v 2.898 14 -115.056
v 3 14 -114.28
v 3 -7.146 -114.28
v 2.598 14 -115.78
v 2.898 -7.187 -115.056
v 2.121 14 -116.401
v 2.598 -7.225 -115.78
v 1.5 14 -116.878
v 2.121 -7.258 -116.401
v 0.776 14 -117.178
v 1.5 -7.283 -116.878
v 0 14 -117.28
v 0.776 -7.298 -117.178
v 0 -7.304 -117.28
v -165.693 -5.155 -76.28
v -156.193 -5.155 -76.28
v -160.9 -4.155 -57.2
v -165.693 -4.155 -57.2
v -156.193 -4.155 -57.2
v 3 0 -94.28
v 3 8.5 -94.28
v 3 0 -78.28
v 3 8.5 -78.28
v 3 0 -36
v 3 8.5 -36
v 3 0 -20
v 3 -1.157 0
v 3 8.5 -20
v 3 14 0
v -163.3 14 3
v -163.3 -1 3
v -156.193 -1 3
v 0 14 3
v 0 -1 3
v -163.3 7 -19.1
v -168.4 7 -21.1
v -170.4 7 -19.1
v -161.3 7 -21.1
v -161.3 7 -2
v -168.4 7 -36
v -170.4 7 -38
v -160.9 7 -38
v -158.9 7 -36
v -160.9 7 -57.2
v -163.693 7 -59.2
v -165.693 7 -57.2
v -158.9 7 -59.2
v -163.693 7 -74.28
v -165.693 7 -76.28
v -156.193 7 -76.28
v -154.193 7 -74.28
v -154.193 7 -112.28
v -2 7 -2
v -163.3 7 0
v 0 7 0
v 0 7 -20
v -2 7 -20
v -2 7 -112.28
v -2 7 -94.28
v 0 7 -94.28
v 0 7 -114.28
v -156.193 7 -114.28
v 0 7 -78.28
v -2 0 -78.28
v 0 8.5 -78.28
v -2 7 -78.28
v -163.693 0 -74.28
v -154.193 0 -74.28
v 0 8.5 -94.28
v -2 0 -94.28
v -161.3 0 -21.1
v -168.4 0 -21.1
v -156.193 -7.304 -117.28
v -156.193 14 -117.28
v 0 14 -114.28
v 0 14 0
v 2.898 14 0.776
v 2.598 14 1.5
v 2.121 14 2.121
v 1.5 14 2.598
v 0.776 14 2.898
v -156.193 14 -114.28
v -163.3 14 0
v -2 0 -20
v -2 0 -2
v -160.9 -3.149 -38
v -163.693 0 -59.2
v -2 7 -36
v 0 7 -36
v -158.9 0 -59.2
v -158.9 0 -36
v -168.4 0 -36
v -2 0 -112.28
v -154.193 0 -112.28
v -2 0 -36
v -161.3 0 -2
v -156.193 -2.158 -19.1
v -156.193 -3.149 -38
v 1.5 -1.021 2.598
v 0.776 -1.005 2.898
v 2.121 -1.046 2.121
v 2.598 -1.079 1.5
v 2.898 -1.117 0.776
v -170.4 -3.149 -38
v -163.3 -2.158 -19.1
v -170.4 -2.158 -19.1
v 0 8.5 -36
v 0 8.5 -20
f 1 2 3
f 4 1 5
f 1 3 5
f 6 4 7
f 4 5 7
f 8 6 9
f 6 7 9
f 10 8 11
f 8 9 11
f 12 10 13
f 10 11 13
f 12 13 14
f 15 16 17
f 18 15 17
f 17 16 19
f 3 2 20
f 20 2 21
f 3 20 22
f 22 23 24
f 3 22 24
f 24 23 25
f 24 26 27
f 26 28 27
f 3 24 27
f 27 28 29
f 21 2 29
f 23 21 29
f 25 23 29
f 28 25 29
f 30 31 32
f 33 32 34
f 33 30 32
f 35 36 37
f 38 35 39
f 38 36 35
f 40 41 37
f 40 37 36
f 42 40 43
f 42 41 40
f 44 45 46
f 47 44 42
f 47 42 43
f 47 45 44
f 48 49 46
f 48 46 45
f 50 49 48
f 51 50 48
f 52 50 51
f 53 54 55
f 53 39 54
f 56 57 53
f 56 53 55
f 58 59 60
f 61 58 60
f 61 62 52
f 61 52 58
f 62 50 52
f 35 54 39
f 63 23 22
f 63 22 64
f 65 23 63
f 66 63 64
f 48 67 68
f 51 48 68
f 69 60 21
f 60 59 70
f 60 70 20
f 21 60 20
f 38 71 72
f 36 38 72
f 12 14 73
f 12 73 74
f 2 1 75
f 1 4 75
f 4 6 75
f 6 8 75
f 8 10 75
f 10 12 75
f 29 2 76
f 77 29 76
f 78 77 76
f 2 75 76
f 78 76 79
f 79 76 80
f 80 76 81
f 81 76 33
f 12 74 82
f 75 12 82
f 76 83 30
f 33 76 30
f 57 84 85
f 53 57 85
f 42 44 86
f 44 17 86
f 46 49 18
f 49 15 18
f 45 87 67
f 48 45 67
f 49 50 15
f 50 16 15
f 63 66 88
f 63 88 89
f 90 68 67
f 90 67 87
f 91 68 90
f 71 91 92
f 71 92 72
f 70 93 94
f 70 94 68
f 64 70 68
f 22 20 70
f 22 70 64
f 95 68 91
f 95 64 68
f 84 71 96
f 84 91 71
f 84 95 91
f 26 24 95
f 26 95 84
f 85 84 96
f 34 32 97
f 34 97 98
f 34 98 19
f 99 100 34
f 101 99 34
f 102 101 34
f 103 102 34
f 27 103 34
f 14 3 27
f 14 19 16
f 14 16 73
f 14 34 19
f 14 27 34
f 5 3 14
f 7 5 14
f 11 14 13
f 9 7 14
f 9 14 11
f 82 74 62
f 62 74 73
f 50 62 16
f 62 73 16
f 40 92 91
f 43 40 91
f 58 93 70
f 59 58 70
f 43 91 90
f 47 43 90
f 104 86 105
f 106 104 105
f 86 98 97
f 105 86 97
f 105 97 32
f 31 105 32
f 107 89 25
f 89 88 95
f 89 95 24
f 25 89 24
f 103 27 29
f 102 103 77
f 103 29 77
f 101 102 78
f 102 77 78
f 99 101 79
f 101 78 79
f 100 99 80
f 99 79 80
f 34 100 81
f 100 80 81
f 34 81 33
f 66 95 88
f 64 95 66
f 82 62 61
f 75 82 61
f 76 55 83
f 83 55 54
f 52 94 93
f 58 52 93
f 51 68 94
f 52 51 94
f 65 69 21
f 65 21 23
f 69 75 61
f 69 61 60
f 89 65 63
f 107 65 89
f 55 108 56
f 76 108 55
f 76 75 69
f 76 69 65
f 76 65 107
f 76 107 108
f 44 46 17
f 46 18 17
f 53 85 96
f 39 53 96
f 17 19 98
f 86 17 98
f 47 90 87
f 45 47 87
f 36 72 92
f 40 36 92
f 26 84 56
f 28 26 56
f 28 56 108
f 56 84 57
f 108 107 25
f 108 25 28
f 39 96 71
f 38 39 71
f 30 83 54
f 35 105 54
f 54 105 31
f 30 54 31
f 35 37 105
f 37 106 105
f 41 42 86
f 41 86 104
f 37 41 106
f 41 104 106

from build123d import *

# Parameters (mm, degrees)
BOSS_EXTRUDE2_DEPTH   = 14
BOSS_EXTRUDE2_2_DEPTH = 14
BOSS_EXTRUDE3_DEPTH   = 1
BOSS_EXTRUDE6_DEPTH   = 159.193
BOSS_EXTRUDE7_DEPTH   = 4.707
BOSS_EXTRUDE8_DEPTH   = 9.5
BOSS_EXTRUDE9_DEPTH   = 7.107
BOSS_EXTRUDE10_DEPTH  = 14.207
SKETCH7_W             = 16
SKETCH7_H             = 8.5
CUT_EXTRUDE1_DEPTH    = 4
FILLET1_R             = 3
FILLET2_R             = 3
SKETCH8_W             = 2
SKETCH8_H             = 42.28
BOSS_EXTRUDE11_DEPTH  = 7
SKETCH9_W             = 16
SKETCH9_H             = 5.5
BOSS_EXTRUDE12_DEPTH  = 3


with BuildPart() as part:
    # Sketch3 → Boss-Extrude2 (new body)
    with BuildSketch(Plane(origin=(0, 0, 0), x_dir=(1, 0, 0), z_dir=(0, 1, 0))):
        Polygon((0, 78.28), (0, 0), (-163.3, 0), (-163.3, -3), (3, -3), (3, 78.28), align=None)
    extrude(amount=BOSS_EXTRUDE2_DEPTH)

    # Sketch3<3> → Boss-Extrude3 (add)
    with BuildSketch(Plane(origin=(0, 0, 0), x_dir=(1, 0, 0), z_dir=(0, 1, 0))):
        Polygon((-163.3, 19.1), (-163.3, -3), (3, -3), (3, 78.28), (0, 78.28), (0, 114.28), (-156.193, 114.28), (-156.193, 76.28), (-165.693, 76.28), (-165.693, 57.2), (-160.9, 57.2), (-160.9, 38), (-170.4, 38), (-170.4, 19.1), align=None)
    extrude(amount=-BOSS_EXTRUDE3_DEPTH)



with BuildPart() as body_2:
    # Sketch3 → Boss-Extrude2 2 (new body)
    with BuildSketch(Plane(origin=(0, 0, 0), x_dir=(1, 0, 0), z_dir=(0, 1, 0))):
        Polygon((0, 114.28), (0, 94.28), (3, 94.28), (3, 117.28), (-156.193, 117.28), (-156.193, 114.28), align=None)
    extrude(amount=BOSS_EXTRUDE2_2_DEPTH)


with BuildPart() as part_1:
    add(part.part)

    add(body_2.part)  # Boss-Extrude6 merges body 2
    # Sketch4 → Boss-Extrude6 (add)
    with BuildSketch(Plane(origin=(3, 0, 0), x_dir=(0, 0, -1), z_dir=(1, 0, 0))):
        Polygon((-3, -1), (117.28, -7.303607692), (117.28, 0), (-3, 0), align=None)
    extrude(amount=-BOSS_EXTRUDE6_DEPTH)

    # Sketch5 → Boss-Extrude7 (add)
    with BuildSketch(Plane.ZY.offset(156.193)):
        Polygon((-38, 0), (-57.2, 0), (-57.2, -4.154948313), (-38, -3.148718951), align=None)
    extrude(amount=BOSS_EXTRUDE7_DEPTH)

    # Sketch5<4> → Boss-Extrude8 (add)
    with BuildSketch(Plane.ZY.offset(156.193)):
        Polygon((-57.2, 0), (-76.28, 0), (-76.28, -5.154888742), (-57.2, -4.154948313), align=None)
    extrude(amount=BOSS_EXTRUDE8_DEPTH)

    # Sketch5 again → Boss-Extrude9 (add)
    with BuildSketch(Plane.ZY.offset(156.193)):
        Polygon((3, -1), (-19.1, -1), (-19.1, -2.158211922), align=None)
    extrude(amount=BOSS_EXTRUDE9_DEPTH)

    # Sketch5<6> → Boss-Extrude10 (add)
    with BuildSketch(Plane.ZY.offset(156.193)):
        Polygon((-19.1, -1), (-38, -1), (-38, -3.148718951), (-19.1, -2.158211922), align=None)
    extrude(amount=BOSS_EXTRUDE10_DEPTH)

    # Sketch7 → Cut-Extrude1 (cut)
    with BuildSketch(Plane.ZY):
        with Locations((-28, 4.25)):
            Rectangle(SKETCH7_W, SKETCH7_H)
    extrude(amount=-CUT_EXTRUDE1_DEPTH, mode=Mode.SUBTRACT)

    # Fillet1
    fillet1_edges = [part_1.edges().sort_by_distance(p)[0] for p in [
        (3, 3.348196154, -117.28),
    ]]
    fillet(fillet1_edges, radius=FILLET1_R)

    # Fillet2
    fillet2_edges = [part_1.edges().sort_by_distance(p)[0] for p in [
        (3, 6.5, 3),
    ]]
    fillet(fillet2_edges, radius=FILLET2_R)

    # Sketch8 → Boss-Extrude11 (add)
    with BuildSketch(Plane(origin=(0, 0, 0), x_dir=(1, 0, 0), z_dir=(0, 1, 0))):
        Polygon((-154.193, 112.28), (-2, 112.28), (-2, 94.28), (0, 94.28), (0, 114.28), (-156.193, 114.28), (-156.193, 76.28), (-165.693, 76.28), (-165.693, 57.2), (-160.9, 57.2), (-160.9, 38), (-170.4, 38), (-170.4, 19.1), (-163.3, 19.1), (-163.3, 0), (0, 0), (0, 20), (-2, 20), (-2, 2), (-161.3, 2), (-161.3, 21.1), (-168.4, 21.1), (-168.4, 36), (-158.9, 36), (-158.9, 59.2), (-163.693, 59.2), (-163.693, 74.28), (-154.193, 74.28), align=None)
        with Locations((-1, 57.14)):
            Rectangle(SKETCH8_W, SKETCH8_H)
    extrude(amount=BOSS_EXTRUDE11_DEPTH)

    # Sketch9 → Boss-Extrude12 (add)
    with BuildSketch(Plane.ZY):
        with Locations((-86.28, 11.25)):
            Rectangle(SKETCH9_W, SKETCH9_H)
    extrude(amount=-BOSS_EXTRUDE12_DEPTH)


solid = part_1.part
